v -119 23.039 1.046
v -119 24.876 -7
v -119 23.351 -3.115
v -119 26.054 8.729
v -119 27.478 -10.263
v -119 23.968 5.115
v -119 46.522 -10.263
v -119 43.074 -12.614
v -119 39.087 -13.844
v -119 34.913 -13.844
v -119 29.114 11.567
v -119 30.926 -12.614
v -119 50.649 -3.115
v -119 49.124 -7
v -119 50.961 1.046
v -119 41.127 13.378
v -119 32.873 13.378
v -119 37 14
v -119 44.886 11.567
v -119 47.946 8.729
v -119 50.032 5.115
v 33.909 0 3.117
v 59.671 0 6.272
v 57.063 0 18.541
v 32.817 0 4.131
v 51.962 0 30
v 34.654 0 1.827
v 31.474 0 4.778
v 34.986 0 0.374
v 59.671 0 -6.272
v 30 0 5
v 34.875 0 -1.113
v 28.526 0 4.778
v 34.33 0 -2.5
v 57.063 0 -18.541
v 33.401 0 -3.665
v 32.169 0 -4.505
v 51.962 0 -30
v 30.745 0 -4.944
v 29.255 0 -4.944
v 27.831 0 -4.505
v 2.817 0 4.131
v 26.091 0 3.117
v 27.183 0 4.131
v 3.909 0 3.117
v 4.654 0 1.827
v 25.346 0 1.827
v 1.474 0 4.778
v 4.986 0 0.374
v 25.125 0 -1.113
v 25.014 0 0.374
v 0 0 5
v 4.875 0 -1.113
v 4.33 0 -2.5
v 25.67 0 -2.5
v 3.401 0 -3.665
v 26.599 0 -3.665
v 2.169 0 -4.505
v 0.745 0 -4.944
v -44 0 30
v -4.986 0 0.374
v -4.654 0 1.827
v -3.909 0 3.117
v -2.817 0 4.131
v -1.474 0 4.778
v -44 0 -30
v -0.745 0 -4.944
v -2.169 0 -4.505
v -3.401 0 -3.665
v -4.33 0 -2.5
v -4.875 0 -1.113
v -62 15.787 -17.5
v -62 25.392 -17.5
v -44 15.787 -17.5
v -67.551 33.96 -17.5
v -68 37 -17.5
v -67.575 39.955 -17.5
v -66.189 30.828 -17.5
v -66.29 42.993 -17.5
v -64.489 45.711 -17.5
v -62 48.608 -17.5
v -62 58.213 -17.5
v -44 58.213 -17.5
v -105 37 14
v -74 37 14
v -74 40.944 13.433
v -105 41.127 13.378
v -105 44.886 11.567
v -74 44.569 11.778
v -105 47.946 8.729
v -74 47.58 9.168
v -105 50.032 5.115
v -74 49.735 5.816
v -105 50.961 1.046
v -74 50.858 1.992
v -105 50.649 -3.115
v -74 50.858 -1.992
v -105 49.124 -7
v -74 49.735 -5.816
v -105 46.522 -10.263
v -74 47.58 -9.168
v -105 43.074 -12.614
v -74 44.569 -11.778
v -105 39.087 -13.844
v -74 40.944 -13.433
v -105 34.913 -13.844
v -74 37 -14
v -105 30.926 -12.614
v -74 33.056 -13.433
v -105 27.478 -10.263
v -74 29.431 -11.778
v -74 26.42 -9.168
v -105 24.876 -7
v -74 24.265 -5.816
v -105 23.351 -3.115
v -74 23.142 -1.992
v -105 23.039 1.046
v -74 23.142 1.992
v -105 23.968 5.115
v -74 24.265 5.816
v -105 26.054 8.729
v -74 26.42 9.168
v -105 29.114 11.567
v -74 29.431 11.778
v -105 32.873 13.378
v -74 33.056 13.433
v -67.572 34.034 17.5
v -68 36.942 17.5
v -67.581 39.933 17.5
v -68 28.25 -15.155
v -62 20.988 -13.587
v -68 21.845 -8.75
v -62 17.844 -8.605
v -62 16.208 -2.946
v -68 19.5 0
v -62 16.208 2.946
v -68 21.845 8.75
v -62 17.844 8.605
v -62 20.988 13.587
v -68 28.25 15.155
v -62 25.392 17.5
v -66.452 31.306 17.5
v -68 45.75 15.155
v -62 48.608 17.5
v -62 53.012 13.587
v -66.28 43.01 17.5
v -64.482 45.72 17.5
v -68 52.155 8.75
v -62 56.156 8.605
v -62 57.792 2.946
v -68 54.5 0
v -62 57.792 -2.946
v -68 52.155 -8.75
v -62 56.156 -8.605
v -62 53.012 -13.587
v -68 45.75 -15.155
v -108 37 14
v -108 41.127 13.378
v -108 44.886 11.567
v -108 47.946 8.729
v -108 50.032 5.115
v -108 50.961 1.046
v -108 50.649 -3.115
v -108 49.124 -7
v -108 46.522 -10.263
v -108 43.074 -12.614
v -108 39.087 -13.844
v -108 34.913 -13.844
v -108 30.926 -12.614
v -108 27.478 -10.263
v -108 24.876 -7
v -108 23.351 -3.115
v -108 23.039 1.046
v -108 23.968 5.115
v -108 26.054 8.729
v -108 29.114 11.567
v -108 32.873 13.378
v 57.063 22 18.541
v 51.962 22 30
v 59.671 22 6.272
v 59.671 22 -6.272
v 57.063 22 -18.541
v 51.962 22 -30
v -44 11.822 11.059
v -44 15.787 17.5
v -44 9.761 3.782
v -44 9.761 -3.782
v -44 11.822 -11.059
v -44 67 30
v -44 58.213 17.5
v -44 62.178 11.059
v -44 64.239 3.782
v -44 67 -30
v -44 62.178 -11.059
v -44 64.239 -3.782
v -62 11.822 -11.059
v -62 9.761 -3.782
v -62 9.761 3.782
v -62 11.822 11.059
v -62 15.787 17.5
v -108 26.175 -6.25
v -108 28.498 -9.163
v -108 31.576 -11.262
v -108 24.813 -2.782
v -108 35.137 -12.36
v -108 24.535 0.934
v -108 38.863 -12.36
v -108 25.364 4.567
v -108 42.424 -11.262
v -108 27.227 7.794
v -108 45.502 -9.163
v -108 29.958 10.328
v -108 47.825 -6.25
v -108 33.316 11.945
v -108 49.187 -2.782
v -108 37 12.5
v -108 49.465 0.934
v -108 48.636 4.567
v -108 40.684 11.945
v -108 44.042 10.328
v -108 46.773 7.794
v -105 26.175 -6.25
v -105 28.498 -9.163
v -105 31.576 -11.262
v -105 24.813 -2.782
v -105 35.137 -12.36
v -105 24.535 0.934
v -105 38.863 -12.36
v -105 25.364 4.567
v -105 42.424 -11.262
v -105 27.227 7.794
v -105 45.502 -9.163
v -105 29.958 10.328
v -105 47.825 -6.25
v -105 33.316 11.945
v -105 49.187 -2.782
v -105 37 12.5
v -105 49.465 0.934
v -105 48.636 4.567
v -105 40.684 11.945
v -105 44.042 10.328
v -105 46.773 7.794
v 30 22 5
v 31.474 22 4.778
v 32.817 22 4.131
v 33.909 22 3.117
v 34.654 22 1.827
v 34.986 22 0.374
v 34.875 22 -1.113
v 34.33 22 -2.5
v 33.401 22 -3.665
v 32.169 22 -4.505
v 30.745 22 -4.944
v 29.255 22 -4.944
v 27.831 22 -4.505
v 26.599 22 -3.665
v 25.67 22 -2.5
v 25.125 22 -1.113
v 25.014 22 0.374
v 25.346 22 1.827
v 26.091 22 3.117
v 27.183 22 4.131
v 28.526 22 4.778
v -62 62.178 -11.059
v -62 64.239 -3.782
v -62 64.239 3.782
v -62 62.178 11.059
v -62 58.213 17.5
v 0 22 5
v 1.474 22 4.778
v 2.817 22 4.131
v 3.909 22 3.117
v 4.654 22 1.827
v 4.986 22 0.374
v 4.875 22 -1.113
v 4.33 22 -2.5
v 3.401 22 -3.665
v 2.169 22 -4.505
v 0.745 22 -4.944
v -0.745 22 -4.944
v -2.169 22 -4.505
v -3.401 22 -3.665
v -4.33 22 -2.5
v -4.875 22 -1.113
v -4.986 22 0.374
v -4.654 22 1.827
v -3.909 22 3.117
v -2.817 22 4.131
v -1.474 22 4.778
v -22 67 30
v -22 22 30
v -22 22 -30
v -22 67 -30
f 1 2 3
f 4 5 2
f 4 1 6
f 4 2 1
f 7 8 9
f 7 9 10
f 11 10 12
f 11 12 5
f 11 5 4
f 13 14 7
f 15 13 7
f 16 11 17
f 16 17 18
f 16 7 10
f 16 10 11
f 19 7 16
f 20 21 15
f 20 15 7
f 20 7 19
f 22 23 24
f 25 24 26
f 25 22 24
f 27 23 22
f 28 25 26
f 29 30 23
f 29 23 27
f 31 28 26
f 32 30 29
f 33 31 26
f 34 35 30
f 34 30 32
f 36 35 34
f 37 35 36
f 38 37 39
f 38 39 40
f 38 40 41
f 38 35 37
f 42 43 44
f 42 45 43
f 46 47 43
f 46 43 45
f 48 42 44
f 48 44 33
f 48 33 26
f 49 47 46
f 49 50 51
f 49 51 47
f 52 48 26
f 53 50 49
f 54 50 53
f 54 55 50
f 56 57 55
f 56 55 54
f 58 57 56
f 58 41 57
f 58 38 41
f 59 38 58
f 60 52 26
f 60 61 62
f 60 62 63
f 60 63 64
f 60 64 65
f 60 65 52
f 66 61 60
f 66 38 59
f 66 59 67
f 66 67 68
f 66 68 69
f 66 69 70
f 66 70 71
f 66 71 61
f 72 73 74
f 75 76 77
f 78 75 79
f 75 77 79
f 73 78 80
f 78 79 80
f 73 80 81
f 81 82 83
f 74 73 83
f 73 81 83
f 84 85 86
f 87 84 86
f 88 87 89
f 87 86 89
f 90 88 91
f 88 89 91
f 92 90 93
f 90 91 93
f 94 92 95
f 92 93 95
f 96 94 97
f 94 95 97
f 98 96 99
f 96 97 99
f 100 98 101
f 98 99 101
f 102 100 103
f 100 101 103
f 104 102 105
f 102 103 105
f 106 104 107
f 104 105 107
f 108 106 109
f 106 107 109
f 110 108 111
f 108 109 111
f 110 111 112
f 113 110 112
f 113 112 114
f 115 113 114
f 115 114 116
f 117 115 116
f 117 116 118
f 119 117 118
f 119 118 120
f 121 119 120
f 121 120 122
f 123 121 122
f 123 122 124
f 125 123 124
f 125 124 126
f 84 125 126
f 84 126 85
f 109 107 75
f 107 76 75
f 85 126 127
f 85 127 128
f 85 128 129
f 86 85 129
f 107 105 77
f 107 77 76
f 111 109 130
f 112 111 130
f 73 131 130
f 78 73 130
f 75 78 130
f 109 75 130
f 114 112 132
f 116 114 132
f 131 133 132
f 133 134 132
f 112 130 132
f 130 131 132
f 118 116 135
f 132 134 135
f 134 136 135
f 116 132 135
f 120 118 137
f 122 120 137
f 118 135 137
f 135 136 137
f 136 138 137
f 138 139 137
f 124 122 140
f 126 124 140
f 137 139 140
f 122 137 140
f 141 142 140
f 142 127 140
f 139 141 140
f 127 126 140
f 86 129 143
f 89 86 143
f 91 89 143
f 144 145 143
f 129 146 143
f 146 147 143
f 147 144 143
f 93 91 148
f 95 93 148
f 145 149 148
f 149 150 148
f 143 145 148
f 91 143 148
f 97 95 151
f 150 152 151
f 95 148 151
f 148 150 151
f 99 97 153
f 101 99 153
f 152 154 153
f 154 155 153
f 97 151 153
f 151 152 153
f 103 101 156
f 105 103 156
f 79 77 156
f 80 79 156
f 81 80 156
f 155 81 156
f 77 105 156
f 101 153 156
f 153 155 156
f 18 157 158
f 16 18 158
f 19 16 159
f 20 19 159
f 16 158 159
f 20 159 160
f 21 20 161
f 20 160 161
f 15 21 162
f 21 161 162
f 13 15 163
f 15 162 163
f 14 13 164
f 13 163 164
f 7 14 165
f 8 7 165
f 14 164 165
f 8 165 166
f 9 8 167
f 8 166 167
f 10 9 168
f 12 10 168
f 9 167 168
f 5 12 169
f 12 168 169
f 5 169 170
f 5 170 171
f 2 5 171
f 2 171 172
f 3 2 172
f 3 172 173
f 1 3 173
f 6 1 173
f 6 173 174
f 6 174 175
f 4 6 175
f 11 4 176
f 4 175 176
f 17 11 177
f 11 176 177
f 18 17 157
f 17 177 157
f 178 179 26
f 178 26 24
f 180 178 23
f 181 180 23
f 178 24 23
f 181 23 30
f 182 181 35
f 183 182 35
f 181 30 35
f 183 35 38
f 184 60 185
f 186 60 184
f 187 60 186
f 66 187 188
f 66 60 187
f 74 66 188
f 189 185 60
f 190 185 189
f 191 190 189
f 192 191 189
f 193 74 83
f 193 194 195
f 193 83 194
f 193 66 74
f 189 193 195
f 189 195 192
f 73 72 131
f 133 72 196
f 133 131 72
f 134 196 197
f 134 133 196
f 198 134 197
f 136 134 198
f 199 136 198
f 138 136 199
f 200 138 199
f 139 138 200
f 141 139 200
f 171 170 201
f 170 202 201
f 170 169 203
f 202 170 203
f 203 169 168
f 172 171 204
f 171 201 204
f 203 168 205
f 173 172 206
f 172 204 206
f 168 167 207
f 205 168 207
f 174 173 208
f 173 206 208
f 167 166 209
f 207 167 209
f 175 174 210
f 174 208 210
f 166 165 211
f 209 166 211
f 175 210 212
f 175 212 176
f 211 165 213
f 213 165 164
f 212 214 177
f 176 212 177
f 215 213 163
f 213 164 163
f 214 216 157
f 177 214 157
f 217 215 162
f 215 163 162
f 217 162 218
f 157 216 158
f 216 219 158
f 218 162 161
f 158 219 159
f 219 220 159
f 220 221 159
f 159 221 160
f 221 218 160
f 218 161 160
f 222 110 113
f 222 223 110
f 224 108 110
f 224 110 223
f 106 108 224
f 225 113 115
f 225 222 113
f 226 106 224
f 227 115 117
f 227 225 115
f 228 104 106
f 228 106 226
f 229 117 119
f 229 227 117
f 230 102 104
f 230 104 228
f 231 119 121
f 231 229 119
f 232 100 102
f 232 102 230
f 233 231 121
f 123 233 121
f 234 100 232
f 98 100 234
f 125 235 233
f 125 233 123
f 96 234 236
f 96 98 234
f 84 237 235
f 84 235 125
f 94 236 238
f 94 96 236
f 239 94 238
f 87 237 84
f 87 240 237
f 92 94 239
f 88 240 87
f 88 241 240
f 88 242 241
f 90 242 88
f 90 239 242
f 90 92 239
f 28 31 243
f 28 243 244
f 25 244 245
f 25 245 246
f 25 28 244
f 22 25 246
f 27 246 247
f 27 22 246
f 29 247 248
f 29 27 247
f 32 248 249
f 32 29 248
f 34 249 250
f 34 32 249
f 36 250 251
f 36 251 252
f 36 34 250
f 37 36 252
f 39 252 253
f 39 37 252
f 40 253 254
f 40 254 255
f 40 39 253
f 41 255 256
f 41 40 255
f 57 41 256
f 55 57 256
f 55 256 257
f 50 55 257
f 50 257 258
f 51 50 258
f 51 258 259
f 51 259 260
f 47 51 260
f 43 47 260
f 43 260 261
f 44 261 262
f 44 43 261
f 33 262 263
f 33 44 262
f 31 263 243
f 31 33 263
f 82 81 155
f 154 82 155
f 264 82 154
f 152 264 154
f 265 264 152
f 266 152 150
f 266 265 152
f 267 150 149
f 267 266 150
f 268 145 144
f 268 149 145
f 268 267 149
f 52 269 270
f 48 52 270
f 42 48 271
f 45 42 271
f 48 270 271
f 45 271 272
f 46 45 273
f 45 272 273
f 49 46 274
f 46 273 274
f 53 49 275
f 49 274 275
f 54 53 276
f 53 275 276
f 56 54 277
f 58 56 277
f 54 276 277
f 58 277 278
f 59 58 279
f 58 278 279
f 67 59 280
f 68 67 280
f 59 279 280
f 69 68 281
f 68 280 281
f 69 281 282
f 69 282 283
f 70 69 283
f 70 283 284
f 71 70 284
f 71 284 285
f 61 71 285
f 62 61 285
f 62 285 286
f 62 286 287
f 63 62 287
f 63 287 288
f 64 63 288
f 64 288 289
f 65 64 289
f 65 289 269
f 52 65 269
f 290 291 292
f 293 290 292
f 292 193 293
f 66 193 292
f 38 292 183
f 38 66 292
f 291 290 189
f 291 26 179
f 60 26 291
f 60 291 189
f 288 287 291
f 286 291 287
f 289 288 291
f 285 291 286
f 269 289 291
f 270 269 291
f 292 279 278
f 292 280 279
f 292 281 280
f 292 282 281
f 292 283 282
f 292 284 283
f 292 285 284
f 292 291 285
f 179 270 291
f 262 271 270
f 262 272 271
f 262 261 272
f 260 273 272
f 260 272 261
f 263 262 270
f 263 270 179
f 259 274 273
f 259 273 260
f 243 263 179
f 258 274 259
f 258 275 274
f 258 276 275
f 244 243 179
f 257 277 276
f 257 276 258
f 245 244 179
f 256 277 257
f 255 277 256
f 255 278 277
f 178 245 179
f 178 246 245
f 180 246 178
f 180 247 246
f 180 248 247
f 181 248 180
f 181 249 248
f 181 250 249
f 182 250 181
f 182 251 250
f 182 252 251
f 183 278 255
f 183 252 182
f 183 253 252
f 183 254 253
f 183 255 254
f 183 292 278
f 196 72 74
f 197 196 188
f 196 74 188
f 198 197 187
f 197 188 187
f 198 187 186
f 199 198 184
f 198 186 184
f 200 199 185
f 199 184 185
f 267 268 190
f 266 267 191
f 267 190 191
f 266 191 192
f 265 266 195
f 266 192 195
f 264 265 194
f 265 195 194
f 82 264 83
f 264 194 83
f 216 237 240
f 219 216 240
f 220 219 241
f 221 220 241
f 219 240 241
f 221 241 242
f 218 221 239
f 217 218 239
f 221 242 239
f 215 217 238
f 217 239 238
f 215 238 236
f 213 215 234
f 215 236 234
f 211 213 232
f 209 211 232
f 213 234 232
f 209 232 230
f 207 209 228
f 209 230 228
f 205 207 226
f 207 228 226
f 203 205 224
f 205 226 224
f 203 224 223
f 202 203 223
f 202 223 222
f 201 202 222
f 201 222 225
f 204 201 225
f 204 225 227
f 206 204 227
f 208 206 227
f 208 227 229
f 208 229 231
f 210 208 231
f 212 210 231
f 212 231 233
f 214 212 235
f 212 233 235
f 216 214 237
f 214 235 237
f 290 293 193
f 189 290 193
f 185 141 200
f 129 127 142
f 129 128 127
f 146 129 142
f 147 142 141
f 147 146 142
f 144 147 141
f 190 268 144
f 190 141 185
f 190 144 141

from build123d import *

# Parameters (mm, degrees)
SKETCH1_R           = 5
BOSS_EXTRUDE1_DEPTH = 22
BOSS_EXTRUDE2_DEPTH = 67
BOSS_EXTRUDE3_DEPTH = 18
SKETCH5_R           = 14
BOSS_EXTRUDE5_DEPTH = 31
SKETCH6_R           = 12.5
BOSS_EXTRUDE6_DEPTH = 3
SKETCH7_R           = 14
BOSS_EXTRUDE7_DEPTH = 11
SKETCH8_W           = 30
SKETCH8_H           = 67
CUT_EXTRUDE1_DEPTH  = 12.5
SKETCH9_R           = 5
CUT_EXTRUDE2_DEPTH  = 32.5


with BuildPart() as part:
    # Sketch1 → Boss-Extrude1 (new body)
    with BuildSketch(Plane(origin=(0, 0, 0), x_dir=(1, 0, 0), z_dir=(0, 1, 0))):
        with BuildLine():
            Line((-22, 0), (-22, -30))
            Line((-22, -30), (0, -30))
            Line((0, -30), (51.961524227, -30))
            ThreePointArc((51.961524227, -30), (60, 0), (51.961524227, 30))
            Line((51.961524227, 30), (0, 30))
            Line((0, 30), (-22, 30))
            Line((-22, 30), (-22, 0))
        make_face()
        with Locations((30, 0)):
            Circle(SKETCH1_R, mode=Mode.SUBTRACT)
    extrude(amount=BOSS_EXTRUDE1_DEPTH)

    # Sketch1<3> → Boss-Extrude2 (add)
    with BuildSketch(Plane(origin=(0, 0, 0), x_dir=(1, 0, 0), z_dir=(0, 1, 0))):
        Polygon((-44, -30), (-22, -30), (-22, 0), (-22, 30), (-44, 30), align=None)
    extrude(amount=BOSS_EXTRUDE2_DEPTH)

    # Sketch2 → Boss-Extrude3 (add)
    with BuildSketch(Plane.ZY.offset(44)):
        with BuildLine():
            ThreePointArc((0, 9.5), (19.445436483, 17.554563517), (27.5, 37))
            ThreePointArc((27.5, 37), (-19.445436483, 56.445436483), (0, 9.5))
        make_face()
    extrude(amount=BOSS_EXTRUDE3_DEPTH)

    # Sketch3 → Revolve2 (revolve)
    with BuildSketch(Plane.XY):
        Polygon((-62, 37), (-74, 37), (-74, 51), (-62, 58), align=None)
    revolve(axis=Axis((-62, 37, 0), (-1, 0, 0)))

    # Sketch5 → Boss-Extrude5 (add)
    with BuildSketch(Plane.ZY.offset(74)):
        with Locations((0, 37)):
            Circle(SKETCH5_R)
    extrude(amount=BOSS_EXTRUDE5_DEPTH)

    # Sketch6 → Boss-Extrude6 (add)
    with BuildSketch(Plane.ZY.offset(105)):
        with Locations((0, 37)):
            Circle(SKETCH6_R)
    extrude(amount=BOSS_EXTRUDE6_DEPTH)

    # Sketch7 → Boss-Extrude7 (add)
    with BuildSketch(Plane.ZY.offset(108)):
        with Locations((0, 37)):
            Circle(SKETCH7_R)
    extrude(amount=BOSS_EXTRUDE7_DEPTH)

    # Sketch8 → Cut-Extrude1 (cut)
    with BuildSketch(Plane.XY.offset(30)):
        with Locations((-59, 33.5)):
            Rectangle(SKETCH8_W, SKETCH8_H)
    cut_extrude1 = extrude(amount=-CUT_EXTRUDE1_DEPTH, mode=Mode.SUBTRACT)

    # Mirror1: Cut-Extrude1 across plane
    add(cut_extrude1.mirror(Plane.XY), mode=Mode.SUBTRACT)

    # Sketch9 → Cut-Extrude2 (cut)
    with BuildSketch(Plane(origin=(0, 22, 0), x_dir=(1, 0, 0), z_dir=(0, 1, 0))):
        Circle(SKETCH9_R)
    extrude(amount=-CUT_EXTRUDE2_DEPTH, mode=Mode.SUBTRACT)


solid = part.part
